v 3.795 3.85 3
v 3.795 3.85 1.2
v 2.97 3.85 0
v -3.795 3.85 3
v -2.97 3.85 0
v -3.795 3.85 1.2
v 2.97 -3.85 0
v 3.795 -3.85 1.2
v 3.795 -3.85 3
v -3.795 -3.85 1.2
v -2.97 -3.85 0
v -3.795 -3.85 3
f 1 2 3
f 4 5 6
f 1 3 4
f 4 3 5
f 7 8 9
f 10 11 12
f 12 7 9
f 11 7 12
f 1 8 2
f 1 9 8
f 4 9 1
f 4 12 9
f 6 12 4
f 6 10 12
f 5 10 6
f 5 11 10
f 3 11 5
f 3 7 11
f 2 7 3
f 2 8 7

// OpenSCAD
/*
  Through Hole Micro female Micro USB connector
  Based on WERI PART NO: 614 105 150 721
  http://www.mouser.com/ds/2/445/614105150721-469235.pdf

  Aaron Ciuffo
  23 December 2013
  GPL V3

*/

/*
      portTopLen
    -----------------
    |               | portSide
    |               |
    \               /
     \             /
      -------------
       portBottomLen
*/


module usbMicro(center = false) {
  portTopLen = 6.9;
  portSide = 1.8;
  portBottomLen = 5.4;
  portSideTotal = 3; 
  portDepth = 7;

  trans = center == false ? 0 : portSideTotal/2; 

  points = [[0, 0], // 0
            [portTopLen, 0], //1
            [portTopLen, -portSide], //2
            [portTopLen/2+portBottomLen/2, -portSideTotal], //3
            [portTopLen/2-portBottomLen/2, -portSideTotal], //4
            [0, - portSide]];

    color("silver")
    translate([-portTopLen/2, portDepth/2, portSideTotal-trans])
    rotate([90, 0, 0])
    linear_extrude(height = portDepth)
    polygon(points);
}

module usbMicroCutter(cutScale = 1.1) {
  scale([cutScale, cutScale])
    usbMicro();
}

//usbMicro();
usbMicroCutter();
